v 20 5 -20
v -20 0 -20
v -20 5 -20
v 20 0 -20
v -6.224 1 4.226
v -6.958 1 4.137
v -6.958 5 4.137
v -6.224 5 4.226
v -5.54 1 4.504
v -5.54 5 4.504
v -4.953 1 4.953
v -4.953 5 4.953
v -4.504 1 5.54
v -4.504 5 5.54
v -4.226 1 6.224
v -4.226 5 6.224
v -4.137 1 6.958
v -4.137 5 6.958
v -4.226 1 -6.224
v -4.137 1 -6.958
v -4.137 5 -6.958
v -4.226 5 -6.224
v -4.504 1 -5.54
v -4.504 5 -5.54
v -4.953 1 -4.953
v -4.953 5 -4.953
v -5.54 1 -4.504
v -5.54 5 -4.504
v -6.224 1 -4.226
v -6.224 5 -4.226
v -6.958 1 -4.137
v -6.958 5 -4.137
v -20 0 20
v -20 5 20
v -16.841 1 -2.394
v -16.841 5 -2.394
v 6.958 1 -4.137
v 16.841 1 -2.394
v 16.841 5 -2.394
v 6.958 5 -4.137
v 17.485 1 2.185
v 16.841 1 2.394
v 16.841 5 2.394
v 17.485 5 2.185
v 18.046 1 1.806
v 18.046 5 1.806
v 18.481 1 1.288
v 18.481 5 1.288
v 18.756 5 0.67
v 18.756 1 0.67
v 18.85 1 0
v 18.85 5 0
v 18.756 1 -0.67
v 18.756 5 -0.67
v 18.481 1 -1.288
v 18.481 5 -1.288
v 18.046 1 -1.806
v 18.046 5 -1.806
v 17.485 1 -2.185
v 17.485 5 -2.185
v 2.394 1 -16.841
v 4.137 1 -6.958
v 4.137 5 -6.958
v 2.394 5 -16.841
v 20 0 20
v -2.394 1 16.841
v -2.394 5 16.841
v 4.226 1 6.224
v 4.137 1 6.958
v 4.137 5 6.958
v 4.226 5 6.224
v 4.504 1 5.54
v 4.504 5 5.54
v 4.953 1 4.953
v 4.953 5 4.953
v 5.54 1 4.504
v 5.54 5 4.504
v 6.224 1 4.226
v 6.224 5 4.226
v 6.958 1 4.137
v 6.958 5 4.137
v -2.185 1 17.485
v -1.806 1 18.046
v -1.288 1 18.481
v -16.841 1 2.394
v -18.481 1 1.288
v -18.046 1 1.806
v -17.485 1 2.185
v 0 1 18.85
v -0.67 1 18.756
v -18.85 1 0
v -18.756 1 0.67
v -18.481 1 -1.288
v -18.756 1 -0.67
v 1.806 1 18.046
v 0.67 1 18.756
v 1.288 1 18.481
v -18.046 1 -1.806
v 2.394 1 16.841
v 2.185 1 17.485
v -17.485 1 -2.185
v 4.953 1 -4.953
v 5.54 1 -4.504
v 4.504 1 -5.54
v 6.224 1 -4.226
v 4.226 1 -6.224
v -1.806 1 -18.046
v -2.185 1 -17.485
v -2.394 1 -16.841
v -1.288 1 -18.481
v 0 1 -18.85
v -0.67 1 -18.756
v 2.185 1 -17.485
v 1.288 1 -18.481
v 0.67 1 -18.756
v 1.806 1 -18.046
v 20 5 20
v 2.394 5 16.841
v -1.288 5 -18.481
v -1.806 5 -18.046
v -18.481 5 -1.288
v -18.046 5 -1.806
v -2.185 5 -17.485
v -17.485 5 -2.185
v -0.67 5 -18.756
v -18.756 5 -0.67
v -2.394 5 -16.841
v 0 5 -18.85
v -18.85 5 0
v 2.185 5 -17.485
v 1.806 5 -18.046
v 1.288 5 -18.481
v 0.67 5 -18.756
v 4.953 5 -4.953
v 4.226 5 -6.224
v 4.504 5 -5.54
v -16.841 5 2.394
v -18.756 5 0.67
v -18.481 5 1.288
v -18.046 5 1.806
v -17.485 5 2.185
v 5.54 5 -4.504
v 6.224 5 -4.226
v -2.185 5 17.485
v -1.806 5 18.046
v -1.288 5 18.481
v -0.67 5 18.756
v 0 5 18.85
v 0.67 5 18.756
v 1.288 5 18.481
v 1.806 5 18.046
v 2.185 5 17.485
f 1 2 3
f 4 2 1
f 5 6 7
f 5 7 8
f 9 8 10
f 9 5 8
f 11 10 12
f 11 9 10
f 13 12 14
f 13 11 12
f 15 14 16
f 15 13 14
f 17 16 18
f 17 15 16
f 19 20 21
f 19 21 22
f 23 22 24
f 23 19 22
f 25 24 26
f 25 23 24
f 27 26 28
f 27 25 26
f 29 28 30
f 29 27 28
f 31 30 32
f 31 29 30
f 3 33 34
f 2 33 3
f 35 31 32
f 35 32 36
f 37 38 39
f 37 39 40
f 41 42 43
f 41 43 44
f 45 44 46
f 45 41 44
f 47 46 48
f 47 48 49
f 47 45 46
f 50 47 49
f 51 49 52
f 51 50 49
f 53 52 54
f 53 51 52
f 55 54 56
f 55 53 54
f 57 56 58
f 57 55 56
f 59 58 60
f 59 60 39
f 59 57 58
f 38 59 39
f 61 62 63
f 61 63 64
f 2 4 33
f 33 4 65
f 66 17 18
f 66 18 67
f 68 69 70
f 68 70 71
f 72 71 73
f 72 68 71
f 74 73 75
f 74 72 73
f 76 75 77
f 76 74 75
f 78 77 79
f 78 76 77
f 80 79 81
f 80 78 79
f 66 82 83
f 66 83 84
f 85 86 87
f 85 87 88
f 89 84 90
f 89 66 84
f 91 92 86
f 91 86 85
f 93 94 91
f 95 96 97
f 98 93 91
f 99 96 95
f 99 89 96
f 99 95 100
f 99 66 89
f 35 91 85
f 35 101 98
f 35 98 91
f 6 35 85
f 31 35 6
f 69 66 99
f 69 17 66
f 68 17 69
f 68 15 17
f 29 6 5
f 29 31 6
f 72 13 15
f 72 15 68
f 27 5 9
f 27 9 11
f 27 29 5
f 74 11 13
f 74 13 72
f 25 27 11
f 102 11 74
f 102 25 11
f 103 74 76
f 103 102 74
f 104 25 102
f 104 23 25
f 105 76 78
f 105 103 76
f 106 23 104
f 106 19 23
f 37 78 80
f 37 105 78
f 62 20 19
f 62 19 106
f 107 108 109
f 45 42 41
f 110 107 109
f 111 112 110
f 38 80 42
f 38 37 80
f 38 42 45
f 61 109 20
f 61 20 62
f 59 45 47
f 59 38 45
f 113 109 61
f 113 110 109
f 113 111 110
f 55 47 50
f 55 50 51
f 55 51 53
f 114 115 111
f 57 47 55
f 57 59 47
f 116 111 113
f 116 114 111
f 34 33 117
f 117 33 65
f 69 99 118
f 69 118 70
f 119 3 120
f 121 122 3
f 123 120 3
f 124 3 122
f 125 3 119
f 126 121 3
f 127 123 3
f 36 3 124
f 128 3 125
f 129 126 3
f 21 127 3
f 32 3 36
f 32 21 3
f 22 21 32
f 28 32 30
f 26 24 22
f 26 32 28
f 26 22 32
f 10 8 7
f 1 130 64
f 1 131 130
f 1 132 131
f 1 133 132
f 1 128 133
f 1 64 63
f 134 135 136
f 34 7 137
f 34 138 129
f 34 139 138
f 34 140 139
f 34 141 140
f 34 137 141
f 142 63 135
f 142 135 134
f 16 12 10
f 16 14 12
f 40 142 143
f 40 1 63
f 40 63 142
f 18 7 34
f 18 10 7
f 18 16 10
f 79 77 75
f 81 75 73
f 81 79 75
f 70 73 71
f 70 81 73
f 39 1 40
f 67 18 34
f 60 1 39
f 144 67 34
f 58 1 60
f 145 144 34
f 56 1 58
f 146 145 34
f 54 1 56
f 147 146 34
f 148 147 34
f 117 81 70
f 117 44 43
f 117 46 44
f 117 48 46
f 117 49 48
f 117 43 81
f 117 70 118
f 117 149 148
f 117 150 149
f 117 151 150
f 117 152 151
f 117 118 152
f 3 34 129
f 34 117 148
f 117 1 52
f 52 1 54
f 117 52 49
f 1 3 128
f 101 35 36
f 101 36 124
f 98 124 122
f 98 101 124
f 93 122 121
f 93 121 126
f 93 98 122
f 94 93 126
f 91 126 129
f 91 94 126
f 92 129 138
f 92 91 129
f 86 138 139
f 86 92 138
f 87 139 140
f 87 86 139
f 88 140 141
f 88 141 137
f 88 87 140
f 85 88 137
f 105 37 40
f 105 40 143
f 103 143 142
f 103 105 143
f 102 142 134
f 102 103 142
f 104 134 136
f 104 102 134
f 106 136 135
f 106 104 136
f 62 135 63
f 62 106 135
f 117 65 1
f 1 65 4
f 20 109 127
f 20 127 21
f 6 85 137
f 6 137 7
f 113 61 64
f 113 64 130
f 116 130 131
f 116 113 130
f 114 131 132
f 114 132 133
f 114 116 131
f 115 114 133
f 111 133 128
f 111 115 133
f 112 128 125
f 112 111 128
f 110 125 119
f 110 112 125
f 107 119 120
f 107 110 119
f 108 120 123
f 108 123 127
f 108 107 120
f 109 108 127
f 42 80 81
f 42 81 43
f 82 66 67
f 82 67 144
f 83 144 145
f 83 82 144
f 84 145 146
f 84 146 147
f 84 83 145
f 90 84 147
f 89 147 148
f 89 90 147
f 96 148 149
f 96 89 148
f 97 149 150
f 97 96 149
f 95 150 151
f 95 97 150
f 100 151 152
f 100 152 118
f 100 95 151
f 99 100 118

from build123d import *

# Parameters (mm, degrees)
SKETCH1_R             = 50
BOSS_EXTRUDE1_DEPTH   = 5
CAVITY1_START         = 1
CAVITY1_OUTLINE_R     = 4.45
CAVITY1_OUTLINE_R_2   = 3.45
CAVITY1_OUTLINE_R_3   = 2.9
CAVITY1_DEPTH         = 2.65
CAVITY1_START_2       = 2
CAVITY1_2_OUTLINE_R   = 4.45
CAVITY1_2_OUTLINE_R_2 = 3.45
CAVITY1_2_OUTLINE_R_3 = 2.9
CAVITY1_2_OUTLINE_R_4 = 1.5
CAVITY1_2_DEPTH       = 1.65
CAVITY1_START_3       = 3.65
CAVITY1_3_OUTLINE_R   = 4.25
CAVITY1_3_OUTLINE_R_2 = 3
CAVITY1_3_DEPTH       = 1.35
CUT_EXTRUDE4_DEPTH    = 4
CUT_EXTRUDE5_START    = -10
SKETCH4_R             = 50
SKETCH4_W             = 40
SKETCH4_H             = 40
CUT_EXTRUDE5_DEPTH    = 10


# Read off the part's stored shape, not the designer's step: Cavity1
with BuildPart() as part:
    # Sketch1 → Boss-Extrude1 (new body)
    with BuildSketch(Plane(origin=(0, 0, 0), x_dir=(1, 0, 0), z_dir=(0, 1, 0))):
        with Locations(Location((0, 0, 0), (0, 0, 270))):
            Circle(SKETCH1_R)
    extrude(amount=BOSS_EXTRUDE1_DEPTH)

    # Cavity1 outline → Cavity1 (cut)
    # profile 1 of 2: a face of its own
    with BuildSketch(Plane(origin=(0, 0, 0), x_dir=(1, 0, 0), z_dir=(0, 1, 0)).offset(CAVITY1_START)):
        with BuildLine():
            Line((-3.736481777, -6.923723208), (-2, -16.771800738))
            ThreePointArc((-2, -16.771800738), (0, -18.45), (2, -16.771800738))
            Line((2, -16.771800738), (3.736481777, -6.923723208))
            ThreePointArc((3.736481777, -6.923723208), (4.670003178, -4.670003178), (6.923723208, -3.736481777))
            Line((6.923723208, -3.736481777), (16.771800738, -2))
            ThreePointArc((16.771800738, -2), (18.45, 0), (16.771800738, 2))
            Line((16.771800738, 2), (6.923723208, 3.736481777))
            ThreePointArc((6.923723208, 3.736481777), (4.670003178, 4.670003178), (3.736481777, 6.923723208))
            Line((3.736481777, 6.923723208), (2, 16.771800738))
            ThreePointArc((2, 16.771800738), (0, 18.45), (-2, 16.771800738))
            Line((-2, 16.771800738), (-3.736481777, 6.923723208))
            ThreePointArc((-3.736481777, 6.923723208), (-4.670003178, 4.670003178), (-6.923723208, 3.736481777))
            Line((-6.923723208, 3.736481777), (-16.771800738, 2))
            ThreePointArc((-16.771800738, 2), (-18.45, 0), (-16.771800738, -2))
            Line((-16.771800738, -2), (-6.923723208, -3.736481777))
            ThreePointArc((-6.923723208, -3.736481777), (-4.670003178, -4.670003178), (-3.736481777, -6.923723208))
        make_face()
        Circle(CAVITY1_OUTLINE_R, mode=Mode.SUBTRACT)
    # profile 2 of 2: a face of its own
    with BuildSketch(Plane(origin=(0, 0, 0), x_dir=(1, 0, 0), z_dir=(0, 1, 0)).offset(CAVITY1_START)):
        Circle(CAVITY1_OUTLINE_R_2)
        Circle(CAVITY1_OUTLINE_R_3, mode=Mode.SUBTRACT)
    extrude(amount=CAVITY1_DEPTH, mode=Mode.SUBTRACT)

    # Cavity1 2 outline → Cavity1 2 (cut)
    # profile 1 of 2: a face of its own
    with BuildSketch(Plane(origin=(0, 0, 0), x_dir=(1, 0, 0), z_dir=(0, 1, 0)).offset(CAVITY1_START_2)):
        Circle(CAVITY1_2_OUTLINE_R)
        Circle(CAVITY1_2_OUTLINE_R_2, mode=Mode.SUBTRACT)
    # profile 2 of 2: a face of its own
    with BuildSketch(Plane(origin=(0, 0, 0), x_dir=(1, 0, 0), z_dir=(0, 1, 0)).offset(CAVITY1_START_2)):
        Circle(CAVITY1_2_OUTLINE_R_3)
        Circle(CAVITY1_2_OUTLINE_R_4, mode=Mode.SUBTRACT)
    extrude(amount=CAVITY1_2_DEPTH, mode=Mode.SUBTRACT)

    # Cavity1 3 outline → Cavity1 3 (cut)
    with BuildSketch(Plane(origin=(0, 0, 0), x_dir=(1, 0, 0), z_dir=(0, 1, 0)).offset(CAVITY1_START_3)):
        Circle(CAVITY1_3_OUTLINE_R)
        Circle(CAVITY1_3_OUTLINE_R_2, mode=Mode.SUBTRACT)
    extrude(amount=CAVITY1_3_DEPTH, mode=Mode.SUBTRACT)

    # Sketch2 → Cut-Extrude4 (cut)
    with BuildSketch(Plane(origin=(0, 1, 0), x_dir=(1, 0, 0), z_dir=(0, 1, 0))):
        with BuildLine():
            Line((-6.957554218, 4.136687101), (-16.841260009, 2.393923101))
            ThreePointArc((-16.841260009, 2.393923101), (-18.85, 0), (-16.841260009, -2.393923101))
            Line((-16.841260009, -2.393923101), (-6.957554218, -4.136687101))
            ThreePointArc((-6.957554218, -4.136687101), (-4.952845891, -4.952845891), (-4.136687101, -6.957554218))
            Line((-4.136687101, -6.957554218), (-2.393923101, -16.841260009))
            ThreePointArc((-2.393923101, -16.841260009), (0, -18.85), (2.393923101, -16.841260009))
            Line((2.393923101, -16.841260009), (4.136687101, -6.957554218))
            ThreePointArc((4.136687101, -6.957554218), (4.952845891, -4.952845891), (6.957554218, -4.136687101))
            Line((6.957554218, -4.136687101), (16.841260009, -2.393923101))
            ThreePointArc((16.841260009, -2.393923101), (18.85, 0), (16.841260009, 2.393923101))
            Line((16.841260009, 2.393923101), (6.957554218, 4.136687101))
            ThreePointArc((6.957554218, 4.136687101), (4.952845891, 4.952845891), (4.136687101, 6.957554218))
            Line((4.136687101, 6.957554218), (2.393923101, 16.841260009))
            ThreePointArc((2.393923101, 16.841260009), (0, 18.85), (-2.393923101, 16.841260009))
            Line((-2.393923101, 16.841260009), (-4.136687101, 6.957554218))
            ThreePointArc((-4.136687101, 6.957554218), (-4.952845891, 4.952845891), (-6.957554218, 4.136687101))
        make_face()
    extrude(amount=CUT_EXTRUDE4_DEPTH, mode=Mode.SUBTRACT)

    # Sketch4 → Cut-Extrude5 (cut)
    with BuildSketch(Plane(origin=(0, 5, 0), x_dir=(1, 0, 0), z_dir=(0, 1, 0)).offset(CUT_EXTRUDE5_START)):
        Circle(SKETCH4_R)
        Rectangle(SKETCH4_W, SKETCH4_H, mode=Mode.SUBTRACT)
    extrude(amount=CUT_EXTRUDE5_DEPTH, mode=Mode.SUBTRACT)


solid = part.part
